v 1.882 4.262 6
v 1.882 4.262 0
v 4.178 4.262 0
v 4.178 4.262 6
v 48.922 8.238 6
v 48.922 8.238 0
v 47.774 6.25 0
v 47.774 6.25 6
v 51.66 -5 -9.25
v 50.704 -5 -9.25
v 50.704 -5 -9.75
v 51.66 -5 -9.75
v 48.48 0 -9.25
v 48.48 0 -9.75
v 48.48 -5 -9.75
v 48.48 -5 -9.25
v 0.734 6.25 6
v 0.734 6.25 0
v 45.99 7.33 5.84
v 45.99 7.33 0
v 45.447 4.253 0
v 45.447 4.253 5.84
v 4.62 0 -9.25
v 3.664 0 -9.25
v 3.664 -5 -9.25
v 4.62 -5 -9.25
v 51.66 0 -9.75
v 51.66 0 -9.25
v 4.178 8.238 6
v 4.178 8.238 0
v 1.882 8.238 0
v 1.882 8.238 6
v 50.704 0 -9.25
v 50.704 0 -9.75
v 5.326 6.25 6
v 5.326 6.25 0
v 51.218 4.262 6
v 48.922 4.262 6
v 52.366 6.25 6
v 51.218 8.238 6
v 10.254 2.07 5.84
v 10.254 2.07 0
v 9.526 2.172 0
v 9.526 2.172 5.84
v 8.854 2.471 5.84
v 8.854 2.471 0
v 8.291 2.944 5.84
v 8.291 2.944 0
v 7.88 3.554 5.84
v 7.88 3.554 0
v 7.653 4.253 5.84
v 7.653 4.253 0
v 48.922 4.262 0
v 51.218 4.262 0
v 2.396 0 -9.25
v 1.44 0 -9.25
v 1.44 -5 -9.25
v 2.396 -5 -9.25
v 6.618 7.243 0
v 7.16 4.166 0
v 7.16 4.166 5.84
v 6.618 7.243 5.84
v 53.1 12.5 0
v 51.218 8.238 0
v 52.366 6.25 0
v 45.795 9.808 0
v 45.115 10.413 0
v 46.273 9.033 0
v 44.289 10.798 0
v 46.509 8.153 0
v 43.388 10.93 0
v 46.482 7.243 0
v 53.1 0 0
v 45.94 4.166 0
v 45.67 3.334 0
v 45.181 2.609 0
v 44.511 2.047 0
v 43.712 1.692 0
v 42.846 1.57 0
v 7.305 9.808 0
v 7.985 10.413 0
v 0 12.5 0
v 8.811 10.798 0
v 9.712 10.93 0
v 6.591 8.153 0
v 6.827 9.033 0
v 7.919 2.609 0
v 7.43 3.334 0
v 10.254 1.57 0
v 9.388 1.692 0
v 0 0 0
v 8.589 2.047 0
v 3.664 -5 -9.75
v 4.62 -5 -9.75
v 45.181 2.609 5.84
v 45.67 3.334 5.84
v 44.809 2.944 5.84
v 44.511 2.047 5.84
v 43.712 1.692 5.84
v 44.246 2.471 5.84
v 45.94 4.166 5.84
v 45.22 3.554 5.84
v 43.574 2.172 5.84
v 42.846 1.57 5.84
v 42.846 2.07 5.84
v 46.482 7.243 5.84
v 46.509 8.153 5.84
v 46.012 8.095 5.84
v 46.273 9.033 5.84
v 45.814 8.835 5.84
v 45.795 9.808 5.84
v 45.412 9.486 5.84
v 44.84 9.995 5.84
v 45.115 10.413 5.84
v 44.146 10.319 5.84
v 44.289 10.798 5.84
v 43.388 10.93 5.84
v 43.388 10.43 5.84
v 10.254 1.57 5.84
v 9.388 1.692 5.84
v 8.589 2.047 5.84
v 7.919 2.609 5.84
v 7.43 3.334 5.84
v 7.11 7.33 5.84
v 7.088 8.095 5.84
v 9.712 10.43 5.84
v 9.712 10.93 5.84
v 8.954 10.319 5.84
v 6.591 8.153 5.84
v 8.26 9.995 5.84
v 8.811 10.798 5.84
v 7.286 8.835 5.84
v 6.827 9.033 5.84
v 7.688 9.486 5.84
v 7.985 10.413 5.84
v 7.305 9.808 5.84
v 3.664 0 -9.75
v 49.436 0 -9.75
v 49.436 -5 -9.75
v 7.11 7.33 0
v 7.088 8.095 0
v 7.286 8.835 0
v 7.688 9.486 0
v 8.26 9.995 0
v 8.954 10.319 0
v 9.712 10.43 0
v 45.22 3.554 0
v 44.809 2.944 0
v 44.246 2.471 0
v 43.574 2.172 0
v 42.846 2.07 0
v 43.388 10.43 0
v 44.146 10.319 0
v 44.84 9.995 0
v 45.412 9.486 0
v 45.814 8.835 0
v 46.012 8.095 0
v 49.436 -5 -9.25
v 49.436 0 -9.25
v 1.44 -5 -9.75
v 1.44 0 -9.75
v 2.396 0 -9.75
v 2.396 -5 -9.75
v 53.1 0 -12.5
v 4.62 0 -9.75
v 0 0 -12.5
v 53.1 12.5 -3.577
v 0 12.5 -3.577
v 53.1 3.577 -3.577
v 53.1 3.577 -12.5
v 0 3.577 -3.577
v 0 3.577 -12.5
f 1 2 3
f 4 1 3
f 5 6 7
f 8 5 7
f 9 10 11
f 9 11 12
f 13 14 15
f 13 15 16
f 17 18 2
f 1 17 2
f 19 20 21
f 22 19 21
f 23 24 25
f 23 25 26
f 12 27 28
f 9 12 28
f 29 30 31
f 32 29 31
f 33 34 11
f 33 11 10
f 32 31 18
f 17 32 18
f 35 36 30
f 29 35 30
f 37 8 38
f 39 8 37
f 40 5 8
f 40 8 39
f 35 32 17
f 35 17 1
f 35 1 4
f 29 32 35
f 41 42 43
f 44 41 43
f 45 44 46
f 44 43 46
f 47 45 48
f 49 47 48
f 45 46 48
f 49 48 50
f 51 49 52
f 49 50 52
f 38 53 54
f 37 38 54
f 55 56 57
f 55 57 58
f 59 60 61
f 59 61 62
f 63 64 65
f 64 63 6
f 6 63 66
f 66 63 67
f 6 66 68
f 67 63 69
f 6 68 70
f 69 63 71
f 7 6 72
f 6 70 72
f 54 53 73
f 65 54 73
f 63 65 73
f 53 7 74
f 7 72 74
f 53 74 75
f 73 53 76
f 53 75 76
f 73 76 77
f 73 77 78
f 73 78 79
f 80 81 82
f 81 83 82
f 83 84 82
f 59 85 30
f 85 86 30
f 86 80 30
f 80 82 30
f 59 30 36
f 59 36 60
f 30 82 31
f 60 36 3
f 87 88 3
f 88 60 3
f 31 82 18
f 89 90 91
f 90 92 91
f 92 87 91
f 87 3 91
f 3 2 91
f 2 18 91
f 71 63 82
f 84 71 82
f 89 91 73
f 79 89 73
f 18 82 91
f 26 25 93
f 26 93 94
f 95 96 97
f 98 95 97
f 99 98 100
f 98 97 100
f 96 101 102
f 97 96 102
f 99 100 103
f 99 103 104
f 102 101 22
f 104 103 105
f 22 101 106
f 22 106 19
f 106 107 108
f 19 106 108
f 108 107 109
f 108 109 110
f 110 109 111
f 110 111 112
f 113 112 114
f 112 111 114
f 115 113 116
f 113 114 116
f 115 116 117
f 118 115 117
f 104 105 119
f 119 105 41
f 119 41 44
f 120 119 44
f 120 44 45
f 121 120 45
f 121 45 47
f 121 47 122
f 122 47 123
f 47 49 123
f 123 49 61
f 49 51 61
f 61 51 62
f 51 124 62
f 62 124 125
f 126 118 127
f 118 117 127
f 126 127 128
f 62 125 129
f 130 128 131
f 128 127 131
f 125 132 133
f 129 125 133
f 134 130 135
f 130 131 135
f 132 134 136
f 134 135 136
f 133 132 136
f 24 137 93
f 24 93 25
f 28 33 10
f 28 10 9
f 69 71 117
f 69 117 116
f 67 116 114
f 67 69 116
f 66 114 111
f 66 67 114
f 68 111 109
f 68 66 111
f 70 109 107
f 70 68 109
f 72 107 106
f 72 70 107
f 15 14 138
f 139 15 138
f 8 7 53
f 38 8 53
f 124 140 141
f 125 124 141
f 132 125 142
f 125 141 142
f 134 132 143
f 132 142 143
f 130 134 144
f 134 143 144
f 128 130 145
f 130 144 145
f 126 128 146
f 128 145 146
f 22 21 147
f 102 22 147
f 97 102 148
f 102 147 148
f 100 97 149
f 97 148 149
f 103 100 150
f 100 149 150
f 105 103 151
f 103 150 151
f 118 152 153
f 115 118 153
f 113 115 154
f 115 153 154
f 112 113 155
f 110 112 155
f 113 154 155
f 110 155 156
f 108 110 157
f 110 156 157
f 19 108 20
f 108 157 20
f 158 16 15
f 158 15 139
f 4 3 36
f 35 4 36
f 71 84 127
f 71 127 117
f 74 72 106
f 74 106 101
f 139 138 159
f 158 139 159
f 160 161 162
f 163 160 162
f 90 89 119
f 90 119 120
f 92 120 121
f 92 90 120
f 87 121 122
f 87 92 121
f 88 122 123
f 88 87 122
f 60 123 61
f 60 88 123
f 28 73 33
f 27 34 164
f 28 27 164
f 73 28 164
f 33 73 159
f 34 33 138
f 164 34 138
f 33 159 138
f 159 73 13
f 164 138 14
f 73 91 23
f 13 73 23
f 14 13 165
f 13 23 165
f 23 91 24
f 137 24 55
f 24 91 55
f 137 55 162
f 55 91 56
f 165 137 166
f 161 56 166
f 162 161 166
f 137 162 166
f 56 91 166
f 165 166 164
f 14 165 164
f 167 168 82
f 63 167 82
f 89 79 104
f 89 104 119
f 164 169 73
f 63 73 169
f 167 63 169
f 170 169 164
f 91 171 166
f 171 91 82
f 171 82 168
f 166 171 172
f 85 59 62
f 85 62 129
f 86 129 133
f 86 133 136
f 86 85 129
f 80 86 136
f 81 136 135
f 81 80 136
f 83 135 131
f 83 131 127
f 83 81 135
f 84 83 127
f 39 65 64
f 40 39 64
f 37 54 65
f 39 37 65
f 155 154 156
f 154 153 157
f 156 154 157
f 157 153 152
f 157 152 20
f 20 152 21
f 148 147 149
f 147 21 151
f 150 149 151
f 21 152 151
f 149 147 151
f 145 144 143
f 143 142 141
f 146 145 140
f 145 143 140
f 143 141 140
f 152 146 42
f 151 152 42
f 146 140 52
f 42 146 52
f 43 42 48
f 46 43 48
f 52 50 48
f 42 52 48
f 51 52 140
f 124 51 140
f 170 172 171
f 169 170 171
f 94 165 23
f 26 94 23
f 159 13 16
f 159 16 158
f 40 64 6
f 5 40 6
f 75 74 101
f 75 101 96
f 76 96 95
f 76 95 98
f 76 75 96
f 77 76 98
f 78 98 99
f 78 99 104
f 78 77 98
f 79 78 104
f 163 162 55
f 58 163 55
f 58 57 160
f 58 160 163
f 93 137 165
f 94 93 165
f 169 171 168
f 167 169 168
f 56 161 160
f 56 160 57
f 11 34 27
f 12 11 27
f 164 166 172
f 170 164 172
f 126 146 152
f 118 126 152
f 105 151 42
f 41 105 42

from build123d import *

# Parameters (mm, degrees)
BOSS_EXTRUDE1_DEPTH = 53.1
SKETCH3_W           = 0.955506131
SKETCH3_H           = 0.5
BOSS_EXTRUDE3_DEPTH = 5
BOSS_EXTRUDE4_DEPTH = 6
BOSS_EXTRUDE5_DEPTH = 5.84


with BuildPart() as part:
    # Sketch1 → Boss-Extrude1 (new body)
    with BuildSketch(Plane(origin=(0, 0, 0), x_dir=(0, 0, -1), z_dir=(1, 0, 0))):
        Polygon((0, 0), (12.5, 0), (12.5, 3.577441077), (3.577441077, 3.577441077), (3.577441077, 12.5), (0, 12.5), align=None)
    extrude(amount=BOSS_EXTRUDE1_DEPTH)

    # Sketch3 → Boss-Extrude3 (add)
    with BuildSketch(Plane.XZ):
        with Locations((1.917753066, -9.5)):
            Rectangle(SKETCH3_W, SKETCH3_H)
        with Locations((4.142246935, -9.5)):
            Rectangle(SKETCH3_W, SKETCH3_H)
        with Locations((48.957753066, -9.5)):
            Rectangle(SKETCH3_W, SKETCH3_H)
        with Locations((51.182246935, -9.5)):
            Rectangle(SKETCH3_W, SKETCH3_H)
    extrude(amount=BOSS_EXTRUDE3_DEPTH)

    # Sketch4 → Boss-Extrude4 (add)
    with BuildSketch(Plane.XY):
        Polygon((4.177995884, 4.261612802), (5.325991768, 6.25), (4.177995884, 8.238387198), (1.882004116, 8.238387198), (0.734008232, 6.25), (1.882004116, 4.261612802), align=None)
        Polygon((51.217995884, 4.261612802), (52.365991768, 6.25), (51.217995884, 8.238387198), (48.922004116, 8.238387198), (47.774008232, 6.25), (48.922004116, 4.261612802), align=None)
    extrude(amount=BOSS_EXTRUDE4_DEPTH)

    # Sketch6 → Boss-Extrude5 (add)
    with BuildSketch(Plane.XY):
        with BuildLine():
            Line((9.7116, 10.93), (43.3884, 10.93))
            ThreePointArc((43.3884, 10.93), (45.795005223, 9.807781555), (46.482272037, 7.242866885))
            Line((46.482272037, 7.242866885), (45.939749183, 4.166066885))
            ThreePointArc((45.939749183, 4.166066885), (44.8652587, 2.304994777), (42.845877146, 1.57))
            Line((42.845877146, 1.57), (10.254122854, 1.57))
            ThreePointArc((10.254122854, 1.57), (8.2347413, 2.304994777), (7.160250817, 4.166066885))
            Line((7.160250817, 4.166066885), (6.617727963, 7.242866885))
            ThreePointArc((6.617727963, 7.242866885), (7.304994777, 9.807781555), (9.7116, 10.93))
        make_face()
        with BuildLine():
            Line((9.7116, 10.43), (43.3884, 10.43))
            ThreePointArc((43.3884, 10.43), (45.411983001, 9.48638775), (45.98986816, 7.329690974))
            Line((45.98986816, 7.329690974), (45.447345306, 4.252890974))
            ThreePointArc((45.447345306, 4.252890974), (44.543864896, 2.688016999), (42.845877146, 2.07))
            Line((42.845877146, 2.07), (10.254122854, 2.07))
            ThreePointArc((10.254122854, 2.07), (8.556135104, 2.688016999), (7.652654694, 4.252890974))
            Line((7.652654694, 4.252890974), (7.11013184, 7.329690974))
            ThreePointArc((7.11013184, 7.329690974), (7.688016999, 9.48638775), (9.7116, 10.43))
        make_face(mode=Mode.SUBTRACT)
    extrude(amount=BOSS_EXTRUDE5_DEPTH)


solid = part.part
